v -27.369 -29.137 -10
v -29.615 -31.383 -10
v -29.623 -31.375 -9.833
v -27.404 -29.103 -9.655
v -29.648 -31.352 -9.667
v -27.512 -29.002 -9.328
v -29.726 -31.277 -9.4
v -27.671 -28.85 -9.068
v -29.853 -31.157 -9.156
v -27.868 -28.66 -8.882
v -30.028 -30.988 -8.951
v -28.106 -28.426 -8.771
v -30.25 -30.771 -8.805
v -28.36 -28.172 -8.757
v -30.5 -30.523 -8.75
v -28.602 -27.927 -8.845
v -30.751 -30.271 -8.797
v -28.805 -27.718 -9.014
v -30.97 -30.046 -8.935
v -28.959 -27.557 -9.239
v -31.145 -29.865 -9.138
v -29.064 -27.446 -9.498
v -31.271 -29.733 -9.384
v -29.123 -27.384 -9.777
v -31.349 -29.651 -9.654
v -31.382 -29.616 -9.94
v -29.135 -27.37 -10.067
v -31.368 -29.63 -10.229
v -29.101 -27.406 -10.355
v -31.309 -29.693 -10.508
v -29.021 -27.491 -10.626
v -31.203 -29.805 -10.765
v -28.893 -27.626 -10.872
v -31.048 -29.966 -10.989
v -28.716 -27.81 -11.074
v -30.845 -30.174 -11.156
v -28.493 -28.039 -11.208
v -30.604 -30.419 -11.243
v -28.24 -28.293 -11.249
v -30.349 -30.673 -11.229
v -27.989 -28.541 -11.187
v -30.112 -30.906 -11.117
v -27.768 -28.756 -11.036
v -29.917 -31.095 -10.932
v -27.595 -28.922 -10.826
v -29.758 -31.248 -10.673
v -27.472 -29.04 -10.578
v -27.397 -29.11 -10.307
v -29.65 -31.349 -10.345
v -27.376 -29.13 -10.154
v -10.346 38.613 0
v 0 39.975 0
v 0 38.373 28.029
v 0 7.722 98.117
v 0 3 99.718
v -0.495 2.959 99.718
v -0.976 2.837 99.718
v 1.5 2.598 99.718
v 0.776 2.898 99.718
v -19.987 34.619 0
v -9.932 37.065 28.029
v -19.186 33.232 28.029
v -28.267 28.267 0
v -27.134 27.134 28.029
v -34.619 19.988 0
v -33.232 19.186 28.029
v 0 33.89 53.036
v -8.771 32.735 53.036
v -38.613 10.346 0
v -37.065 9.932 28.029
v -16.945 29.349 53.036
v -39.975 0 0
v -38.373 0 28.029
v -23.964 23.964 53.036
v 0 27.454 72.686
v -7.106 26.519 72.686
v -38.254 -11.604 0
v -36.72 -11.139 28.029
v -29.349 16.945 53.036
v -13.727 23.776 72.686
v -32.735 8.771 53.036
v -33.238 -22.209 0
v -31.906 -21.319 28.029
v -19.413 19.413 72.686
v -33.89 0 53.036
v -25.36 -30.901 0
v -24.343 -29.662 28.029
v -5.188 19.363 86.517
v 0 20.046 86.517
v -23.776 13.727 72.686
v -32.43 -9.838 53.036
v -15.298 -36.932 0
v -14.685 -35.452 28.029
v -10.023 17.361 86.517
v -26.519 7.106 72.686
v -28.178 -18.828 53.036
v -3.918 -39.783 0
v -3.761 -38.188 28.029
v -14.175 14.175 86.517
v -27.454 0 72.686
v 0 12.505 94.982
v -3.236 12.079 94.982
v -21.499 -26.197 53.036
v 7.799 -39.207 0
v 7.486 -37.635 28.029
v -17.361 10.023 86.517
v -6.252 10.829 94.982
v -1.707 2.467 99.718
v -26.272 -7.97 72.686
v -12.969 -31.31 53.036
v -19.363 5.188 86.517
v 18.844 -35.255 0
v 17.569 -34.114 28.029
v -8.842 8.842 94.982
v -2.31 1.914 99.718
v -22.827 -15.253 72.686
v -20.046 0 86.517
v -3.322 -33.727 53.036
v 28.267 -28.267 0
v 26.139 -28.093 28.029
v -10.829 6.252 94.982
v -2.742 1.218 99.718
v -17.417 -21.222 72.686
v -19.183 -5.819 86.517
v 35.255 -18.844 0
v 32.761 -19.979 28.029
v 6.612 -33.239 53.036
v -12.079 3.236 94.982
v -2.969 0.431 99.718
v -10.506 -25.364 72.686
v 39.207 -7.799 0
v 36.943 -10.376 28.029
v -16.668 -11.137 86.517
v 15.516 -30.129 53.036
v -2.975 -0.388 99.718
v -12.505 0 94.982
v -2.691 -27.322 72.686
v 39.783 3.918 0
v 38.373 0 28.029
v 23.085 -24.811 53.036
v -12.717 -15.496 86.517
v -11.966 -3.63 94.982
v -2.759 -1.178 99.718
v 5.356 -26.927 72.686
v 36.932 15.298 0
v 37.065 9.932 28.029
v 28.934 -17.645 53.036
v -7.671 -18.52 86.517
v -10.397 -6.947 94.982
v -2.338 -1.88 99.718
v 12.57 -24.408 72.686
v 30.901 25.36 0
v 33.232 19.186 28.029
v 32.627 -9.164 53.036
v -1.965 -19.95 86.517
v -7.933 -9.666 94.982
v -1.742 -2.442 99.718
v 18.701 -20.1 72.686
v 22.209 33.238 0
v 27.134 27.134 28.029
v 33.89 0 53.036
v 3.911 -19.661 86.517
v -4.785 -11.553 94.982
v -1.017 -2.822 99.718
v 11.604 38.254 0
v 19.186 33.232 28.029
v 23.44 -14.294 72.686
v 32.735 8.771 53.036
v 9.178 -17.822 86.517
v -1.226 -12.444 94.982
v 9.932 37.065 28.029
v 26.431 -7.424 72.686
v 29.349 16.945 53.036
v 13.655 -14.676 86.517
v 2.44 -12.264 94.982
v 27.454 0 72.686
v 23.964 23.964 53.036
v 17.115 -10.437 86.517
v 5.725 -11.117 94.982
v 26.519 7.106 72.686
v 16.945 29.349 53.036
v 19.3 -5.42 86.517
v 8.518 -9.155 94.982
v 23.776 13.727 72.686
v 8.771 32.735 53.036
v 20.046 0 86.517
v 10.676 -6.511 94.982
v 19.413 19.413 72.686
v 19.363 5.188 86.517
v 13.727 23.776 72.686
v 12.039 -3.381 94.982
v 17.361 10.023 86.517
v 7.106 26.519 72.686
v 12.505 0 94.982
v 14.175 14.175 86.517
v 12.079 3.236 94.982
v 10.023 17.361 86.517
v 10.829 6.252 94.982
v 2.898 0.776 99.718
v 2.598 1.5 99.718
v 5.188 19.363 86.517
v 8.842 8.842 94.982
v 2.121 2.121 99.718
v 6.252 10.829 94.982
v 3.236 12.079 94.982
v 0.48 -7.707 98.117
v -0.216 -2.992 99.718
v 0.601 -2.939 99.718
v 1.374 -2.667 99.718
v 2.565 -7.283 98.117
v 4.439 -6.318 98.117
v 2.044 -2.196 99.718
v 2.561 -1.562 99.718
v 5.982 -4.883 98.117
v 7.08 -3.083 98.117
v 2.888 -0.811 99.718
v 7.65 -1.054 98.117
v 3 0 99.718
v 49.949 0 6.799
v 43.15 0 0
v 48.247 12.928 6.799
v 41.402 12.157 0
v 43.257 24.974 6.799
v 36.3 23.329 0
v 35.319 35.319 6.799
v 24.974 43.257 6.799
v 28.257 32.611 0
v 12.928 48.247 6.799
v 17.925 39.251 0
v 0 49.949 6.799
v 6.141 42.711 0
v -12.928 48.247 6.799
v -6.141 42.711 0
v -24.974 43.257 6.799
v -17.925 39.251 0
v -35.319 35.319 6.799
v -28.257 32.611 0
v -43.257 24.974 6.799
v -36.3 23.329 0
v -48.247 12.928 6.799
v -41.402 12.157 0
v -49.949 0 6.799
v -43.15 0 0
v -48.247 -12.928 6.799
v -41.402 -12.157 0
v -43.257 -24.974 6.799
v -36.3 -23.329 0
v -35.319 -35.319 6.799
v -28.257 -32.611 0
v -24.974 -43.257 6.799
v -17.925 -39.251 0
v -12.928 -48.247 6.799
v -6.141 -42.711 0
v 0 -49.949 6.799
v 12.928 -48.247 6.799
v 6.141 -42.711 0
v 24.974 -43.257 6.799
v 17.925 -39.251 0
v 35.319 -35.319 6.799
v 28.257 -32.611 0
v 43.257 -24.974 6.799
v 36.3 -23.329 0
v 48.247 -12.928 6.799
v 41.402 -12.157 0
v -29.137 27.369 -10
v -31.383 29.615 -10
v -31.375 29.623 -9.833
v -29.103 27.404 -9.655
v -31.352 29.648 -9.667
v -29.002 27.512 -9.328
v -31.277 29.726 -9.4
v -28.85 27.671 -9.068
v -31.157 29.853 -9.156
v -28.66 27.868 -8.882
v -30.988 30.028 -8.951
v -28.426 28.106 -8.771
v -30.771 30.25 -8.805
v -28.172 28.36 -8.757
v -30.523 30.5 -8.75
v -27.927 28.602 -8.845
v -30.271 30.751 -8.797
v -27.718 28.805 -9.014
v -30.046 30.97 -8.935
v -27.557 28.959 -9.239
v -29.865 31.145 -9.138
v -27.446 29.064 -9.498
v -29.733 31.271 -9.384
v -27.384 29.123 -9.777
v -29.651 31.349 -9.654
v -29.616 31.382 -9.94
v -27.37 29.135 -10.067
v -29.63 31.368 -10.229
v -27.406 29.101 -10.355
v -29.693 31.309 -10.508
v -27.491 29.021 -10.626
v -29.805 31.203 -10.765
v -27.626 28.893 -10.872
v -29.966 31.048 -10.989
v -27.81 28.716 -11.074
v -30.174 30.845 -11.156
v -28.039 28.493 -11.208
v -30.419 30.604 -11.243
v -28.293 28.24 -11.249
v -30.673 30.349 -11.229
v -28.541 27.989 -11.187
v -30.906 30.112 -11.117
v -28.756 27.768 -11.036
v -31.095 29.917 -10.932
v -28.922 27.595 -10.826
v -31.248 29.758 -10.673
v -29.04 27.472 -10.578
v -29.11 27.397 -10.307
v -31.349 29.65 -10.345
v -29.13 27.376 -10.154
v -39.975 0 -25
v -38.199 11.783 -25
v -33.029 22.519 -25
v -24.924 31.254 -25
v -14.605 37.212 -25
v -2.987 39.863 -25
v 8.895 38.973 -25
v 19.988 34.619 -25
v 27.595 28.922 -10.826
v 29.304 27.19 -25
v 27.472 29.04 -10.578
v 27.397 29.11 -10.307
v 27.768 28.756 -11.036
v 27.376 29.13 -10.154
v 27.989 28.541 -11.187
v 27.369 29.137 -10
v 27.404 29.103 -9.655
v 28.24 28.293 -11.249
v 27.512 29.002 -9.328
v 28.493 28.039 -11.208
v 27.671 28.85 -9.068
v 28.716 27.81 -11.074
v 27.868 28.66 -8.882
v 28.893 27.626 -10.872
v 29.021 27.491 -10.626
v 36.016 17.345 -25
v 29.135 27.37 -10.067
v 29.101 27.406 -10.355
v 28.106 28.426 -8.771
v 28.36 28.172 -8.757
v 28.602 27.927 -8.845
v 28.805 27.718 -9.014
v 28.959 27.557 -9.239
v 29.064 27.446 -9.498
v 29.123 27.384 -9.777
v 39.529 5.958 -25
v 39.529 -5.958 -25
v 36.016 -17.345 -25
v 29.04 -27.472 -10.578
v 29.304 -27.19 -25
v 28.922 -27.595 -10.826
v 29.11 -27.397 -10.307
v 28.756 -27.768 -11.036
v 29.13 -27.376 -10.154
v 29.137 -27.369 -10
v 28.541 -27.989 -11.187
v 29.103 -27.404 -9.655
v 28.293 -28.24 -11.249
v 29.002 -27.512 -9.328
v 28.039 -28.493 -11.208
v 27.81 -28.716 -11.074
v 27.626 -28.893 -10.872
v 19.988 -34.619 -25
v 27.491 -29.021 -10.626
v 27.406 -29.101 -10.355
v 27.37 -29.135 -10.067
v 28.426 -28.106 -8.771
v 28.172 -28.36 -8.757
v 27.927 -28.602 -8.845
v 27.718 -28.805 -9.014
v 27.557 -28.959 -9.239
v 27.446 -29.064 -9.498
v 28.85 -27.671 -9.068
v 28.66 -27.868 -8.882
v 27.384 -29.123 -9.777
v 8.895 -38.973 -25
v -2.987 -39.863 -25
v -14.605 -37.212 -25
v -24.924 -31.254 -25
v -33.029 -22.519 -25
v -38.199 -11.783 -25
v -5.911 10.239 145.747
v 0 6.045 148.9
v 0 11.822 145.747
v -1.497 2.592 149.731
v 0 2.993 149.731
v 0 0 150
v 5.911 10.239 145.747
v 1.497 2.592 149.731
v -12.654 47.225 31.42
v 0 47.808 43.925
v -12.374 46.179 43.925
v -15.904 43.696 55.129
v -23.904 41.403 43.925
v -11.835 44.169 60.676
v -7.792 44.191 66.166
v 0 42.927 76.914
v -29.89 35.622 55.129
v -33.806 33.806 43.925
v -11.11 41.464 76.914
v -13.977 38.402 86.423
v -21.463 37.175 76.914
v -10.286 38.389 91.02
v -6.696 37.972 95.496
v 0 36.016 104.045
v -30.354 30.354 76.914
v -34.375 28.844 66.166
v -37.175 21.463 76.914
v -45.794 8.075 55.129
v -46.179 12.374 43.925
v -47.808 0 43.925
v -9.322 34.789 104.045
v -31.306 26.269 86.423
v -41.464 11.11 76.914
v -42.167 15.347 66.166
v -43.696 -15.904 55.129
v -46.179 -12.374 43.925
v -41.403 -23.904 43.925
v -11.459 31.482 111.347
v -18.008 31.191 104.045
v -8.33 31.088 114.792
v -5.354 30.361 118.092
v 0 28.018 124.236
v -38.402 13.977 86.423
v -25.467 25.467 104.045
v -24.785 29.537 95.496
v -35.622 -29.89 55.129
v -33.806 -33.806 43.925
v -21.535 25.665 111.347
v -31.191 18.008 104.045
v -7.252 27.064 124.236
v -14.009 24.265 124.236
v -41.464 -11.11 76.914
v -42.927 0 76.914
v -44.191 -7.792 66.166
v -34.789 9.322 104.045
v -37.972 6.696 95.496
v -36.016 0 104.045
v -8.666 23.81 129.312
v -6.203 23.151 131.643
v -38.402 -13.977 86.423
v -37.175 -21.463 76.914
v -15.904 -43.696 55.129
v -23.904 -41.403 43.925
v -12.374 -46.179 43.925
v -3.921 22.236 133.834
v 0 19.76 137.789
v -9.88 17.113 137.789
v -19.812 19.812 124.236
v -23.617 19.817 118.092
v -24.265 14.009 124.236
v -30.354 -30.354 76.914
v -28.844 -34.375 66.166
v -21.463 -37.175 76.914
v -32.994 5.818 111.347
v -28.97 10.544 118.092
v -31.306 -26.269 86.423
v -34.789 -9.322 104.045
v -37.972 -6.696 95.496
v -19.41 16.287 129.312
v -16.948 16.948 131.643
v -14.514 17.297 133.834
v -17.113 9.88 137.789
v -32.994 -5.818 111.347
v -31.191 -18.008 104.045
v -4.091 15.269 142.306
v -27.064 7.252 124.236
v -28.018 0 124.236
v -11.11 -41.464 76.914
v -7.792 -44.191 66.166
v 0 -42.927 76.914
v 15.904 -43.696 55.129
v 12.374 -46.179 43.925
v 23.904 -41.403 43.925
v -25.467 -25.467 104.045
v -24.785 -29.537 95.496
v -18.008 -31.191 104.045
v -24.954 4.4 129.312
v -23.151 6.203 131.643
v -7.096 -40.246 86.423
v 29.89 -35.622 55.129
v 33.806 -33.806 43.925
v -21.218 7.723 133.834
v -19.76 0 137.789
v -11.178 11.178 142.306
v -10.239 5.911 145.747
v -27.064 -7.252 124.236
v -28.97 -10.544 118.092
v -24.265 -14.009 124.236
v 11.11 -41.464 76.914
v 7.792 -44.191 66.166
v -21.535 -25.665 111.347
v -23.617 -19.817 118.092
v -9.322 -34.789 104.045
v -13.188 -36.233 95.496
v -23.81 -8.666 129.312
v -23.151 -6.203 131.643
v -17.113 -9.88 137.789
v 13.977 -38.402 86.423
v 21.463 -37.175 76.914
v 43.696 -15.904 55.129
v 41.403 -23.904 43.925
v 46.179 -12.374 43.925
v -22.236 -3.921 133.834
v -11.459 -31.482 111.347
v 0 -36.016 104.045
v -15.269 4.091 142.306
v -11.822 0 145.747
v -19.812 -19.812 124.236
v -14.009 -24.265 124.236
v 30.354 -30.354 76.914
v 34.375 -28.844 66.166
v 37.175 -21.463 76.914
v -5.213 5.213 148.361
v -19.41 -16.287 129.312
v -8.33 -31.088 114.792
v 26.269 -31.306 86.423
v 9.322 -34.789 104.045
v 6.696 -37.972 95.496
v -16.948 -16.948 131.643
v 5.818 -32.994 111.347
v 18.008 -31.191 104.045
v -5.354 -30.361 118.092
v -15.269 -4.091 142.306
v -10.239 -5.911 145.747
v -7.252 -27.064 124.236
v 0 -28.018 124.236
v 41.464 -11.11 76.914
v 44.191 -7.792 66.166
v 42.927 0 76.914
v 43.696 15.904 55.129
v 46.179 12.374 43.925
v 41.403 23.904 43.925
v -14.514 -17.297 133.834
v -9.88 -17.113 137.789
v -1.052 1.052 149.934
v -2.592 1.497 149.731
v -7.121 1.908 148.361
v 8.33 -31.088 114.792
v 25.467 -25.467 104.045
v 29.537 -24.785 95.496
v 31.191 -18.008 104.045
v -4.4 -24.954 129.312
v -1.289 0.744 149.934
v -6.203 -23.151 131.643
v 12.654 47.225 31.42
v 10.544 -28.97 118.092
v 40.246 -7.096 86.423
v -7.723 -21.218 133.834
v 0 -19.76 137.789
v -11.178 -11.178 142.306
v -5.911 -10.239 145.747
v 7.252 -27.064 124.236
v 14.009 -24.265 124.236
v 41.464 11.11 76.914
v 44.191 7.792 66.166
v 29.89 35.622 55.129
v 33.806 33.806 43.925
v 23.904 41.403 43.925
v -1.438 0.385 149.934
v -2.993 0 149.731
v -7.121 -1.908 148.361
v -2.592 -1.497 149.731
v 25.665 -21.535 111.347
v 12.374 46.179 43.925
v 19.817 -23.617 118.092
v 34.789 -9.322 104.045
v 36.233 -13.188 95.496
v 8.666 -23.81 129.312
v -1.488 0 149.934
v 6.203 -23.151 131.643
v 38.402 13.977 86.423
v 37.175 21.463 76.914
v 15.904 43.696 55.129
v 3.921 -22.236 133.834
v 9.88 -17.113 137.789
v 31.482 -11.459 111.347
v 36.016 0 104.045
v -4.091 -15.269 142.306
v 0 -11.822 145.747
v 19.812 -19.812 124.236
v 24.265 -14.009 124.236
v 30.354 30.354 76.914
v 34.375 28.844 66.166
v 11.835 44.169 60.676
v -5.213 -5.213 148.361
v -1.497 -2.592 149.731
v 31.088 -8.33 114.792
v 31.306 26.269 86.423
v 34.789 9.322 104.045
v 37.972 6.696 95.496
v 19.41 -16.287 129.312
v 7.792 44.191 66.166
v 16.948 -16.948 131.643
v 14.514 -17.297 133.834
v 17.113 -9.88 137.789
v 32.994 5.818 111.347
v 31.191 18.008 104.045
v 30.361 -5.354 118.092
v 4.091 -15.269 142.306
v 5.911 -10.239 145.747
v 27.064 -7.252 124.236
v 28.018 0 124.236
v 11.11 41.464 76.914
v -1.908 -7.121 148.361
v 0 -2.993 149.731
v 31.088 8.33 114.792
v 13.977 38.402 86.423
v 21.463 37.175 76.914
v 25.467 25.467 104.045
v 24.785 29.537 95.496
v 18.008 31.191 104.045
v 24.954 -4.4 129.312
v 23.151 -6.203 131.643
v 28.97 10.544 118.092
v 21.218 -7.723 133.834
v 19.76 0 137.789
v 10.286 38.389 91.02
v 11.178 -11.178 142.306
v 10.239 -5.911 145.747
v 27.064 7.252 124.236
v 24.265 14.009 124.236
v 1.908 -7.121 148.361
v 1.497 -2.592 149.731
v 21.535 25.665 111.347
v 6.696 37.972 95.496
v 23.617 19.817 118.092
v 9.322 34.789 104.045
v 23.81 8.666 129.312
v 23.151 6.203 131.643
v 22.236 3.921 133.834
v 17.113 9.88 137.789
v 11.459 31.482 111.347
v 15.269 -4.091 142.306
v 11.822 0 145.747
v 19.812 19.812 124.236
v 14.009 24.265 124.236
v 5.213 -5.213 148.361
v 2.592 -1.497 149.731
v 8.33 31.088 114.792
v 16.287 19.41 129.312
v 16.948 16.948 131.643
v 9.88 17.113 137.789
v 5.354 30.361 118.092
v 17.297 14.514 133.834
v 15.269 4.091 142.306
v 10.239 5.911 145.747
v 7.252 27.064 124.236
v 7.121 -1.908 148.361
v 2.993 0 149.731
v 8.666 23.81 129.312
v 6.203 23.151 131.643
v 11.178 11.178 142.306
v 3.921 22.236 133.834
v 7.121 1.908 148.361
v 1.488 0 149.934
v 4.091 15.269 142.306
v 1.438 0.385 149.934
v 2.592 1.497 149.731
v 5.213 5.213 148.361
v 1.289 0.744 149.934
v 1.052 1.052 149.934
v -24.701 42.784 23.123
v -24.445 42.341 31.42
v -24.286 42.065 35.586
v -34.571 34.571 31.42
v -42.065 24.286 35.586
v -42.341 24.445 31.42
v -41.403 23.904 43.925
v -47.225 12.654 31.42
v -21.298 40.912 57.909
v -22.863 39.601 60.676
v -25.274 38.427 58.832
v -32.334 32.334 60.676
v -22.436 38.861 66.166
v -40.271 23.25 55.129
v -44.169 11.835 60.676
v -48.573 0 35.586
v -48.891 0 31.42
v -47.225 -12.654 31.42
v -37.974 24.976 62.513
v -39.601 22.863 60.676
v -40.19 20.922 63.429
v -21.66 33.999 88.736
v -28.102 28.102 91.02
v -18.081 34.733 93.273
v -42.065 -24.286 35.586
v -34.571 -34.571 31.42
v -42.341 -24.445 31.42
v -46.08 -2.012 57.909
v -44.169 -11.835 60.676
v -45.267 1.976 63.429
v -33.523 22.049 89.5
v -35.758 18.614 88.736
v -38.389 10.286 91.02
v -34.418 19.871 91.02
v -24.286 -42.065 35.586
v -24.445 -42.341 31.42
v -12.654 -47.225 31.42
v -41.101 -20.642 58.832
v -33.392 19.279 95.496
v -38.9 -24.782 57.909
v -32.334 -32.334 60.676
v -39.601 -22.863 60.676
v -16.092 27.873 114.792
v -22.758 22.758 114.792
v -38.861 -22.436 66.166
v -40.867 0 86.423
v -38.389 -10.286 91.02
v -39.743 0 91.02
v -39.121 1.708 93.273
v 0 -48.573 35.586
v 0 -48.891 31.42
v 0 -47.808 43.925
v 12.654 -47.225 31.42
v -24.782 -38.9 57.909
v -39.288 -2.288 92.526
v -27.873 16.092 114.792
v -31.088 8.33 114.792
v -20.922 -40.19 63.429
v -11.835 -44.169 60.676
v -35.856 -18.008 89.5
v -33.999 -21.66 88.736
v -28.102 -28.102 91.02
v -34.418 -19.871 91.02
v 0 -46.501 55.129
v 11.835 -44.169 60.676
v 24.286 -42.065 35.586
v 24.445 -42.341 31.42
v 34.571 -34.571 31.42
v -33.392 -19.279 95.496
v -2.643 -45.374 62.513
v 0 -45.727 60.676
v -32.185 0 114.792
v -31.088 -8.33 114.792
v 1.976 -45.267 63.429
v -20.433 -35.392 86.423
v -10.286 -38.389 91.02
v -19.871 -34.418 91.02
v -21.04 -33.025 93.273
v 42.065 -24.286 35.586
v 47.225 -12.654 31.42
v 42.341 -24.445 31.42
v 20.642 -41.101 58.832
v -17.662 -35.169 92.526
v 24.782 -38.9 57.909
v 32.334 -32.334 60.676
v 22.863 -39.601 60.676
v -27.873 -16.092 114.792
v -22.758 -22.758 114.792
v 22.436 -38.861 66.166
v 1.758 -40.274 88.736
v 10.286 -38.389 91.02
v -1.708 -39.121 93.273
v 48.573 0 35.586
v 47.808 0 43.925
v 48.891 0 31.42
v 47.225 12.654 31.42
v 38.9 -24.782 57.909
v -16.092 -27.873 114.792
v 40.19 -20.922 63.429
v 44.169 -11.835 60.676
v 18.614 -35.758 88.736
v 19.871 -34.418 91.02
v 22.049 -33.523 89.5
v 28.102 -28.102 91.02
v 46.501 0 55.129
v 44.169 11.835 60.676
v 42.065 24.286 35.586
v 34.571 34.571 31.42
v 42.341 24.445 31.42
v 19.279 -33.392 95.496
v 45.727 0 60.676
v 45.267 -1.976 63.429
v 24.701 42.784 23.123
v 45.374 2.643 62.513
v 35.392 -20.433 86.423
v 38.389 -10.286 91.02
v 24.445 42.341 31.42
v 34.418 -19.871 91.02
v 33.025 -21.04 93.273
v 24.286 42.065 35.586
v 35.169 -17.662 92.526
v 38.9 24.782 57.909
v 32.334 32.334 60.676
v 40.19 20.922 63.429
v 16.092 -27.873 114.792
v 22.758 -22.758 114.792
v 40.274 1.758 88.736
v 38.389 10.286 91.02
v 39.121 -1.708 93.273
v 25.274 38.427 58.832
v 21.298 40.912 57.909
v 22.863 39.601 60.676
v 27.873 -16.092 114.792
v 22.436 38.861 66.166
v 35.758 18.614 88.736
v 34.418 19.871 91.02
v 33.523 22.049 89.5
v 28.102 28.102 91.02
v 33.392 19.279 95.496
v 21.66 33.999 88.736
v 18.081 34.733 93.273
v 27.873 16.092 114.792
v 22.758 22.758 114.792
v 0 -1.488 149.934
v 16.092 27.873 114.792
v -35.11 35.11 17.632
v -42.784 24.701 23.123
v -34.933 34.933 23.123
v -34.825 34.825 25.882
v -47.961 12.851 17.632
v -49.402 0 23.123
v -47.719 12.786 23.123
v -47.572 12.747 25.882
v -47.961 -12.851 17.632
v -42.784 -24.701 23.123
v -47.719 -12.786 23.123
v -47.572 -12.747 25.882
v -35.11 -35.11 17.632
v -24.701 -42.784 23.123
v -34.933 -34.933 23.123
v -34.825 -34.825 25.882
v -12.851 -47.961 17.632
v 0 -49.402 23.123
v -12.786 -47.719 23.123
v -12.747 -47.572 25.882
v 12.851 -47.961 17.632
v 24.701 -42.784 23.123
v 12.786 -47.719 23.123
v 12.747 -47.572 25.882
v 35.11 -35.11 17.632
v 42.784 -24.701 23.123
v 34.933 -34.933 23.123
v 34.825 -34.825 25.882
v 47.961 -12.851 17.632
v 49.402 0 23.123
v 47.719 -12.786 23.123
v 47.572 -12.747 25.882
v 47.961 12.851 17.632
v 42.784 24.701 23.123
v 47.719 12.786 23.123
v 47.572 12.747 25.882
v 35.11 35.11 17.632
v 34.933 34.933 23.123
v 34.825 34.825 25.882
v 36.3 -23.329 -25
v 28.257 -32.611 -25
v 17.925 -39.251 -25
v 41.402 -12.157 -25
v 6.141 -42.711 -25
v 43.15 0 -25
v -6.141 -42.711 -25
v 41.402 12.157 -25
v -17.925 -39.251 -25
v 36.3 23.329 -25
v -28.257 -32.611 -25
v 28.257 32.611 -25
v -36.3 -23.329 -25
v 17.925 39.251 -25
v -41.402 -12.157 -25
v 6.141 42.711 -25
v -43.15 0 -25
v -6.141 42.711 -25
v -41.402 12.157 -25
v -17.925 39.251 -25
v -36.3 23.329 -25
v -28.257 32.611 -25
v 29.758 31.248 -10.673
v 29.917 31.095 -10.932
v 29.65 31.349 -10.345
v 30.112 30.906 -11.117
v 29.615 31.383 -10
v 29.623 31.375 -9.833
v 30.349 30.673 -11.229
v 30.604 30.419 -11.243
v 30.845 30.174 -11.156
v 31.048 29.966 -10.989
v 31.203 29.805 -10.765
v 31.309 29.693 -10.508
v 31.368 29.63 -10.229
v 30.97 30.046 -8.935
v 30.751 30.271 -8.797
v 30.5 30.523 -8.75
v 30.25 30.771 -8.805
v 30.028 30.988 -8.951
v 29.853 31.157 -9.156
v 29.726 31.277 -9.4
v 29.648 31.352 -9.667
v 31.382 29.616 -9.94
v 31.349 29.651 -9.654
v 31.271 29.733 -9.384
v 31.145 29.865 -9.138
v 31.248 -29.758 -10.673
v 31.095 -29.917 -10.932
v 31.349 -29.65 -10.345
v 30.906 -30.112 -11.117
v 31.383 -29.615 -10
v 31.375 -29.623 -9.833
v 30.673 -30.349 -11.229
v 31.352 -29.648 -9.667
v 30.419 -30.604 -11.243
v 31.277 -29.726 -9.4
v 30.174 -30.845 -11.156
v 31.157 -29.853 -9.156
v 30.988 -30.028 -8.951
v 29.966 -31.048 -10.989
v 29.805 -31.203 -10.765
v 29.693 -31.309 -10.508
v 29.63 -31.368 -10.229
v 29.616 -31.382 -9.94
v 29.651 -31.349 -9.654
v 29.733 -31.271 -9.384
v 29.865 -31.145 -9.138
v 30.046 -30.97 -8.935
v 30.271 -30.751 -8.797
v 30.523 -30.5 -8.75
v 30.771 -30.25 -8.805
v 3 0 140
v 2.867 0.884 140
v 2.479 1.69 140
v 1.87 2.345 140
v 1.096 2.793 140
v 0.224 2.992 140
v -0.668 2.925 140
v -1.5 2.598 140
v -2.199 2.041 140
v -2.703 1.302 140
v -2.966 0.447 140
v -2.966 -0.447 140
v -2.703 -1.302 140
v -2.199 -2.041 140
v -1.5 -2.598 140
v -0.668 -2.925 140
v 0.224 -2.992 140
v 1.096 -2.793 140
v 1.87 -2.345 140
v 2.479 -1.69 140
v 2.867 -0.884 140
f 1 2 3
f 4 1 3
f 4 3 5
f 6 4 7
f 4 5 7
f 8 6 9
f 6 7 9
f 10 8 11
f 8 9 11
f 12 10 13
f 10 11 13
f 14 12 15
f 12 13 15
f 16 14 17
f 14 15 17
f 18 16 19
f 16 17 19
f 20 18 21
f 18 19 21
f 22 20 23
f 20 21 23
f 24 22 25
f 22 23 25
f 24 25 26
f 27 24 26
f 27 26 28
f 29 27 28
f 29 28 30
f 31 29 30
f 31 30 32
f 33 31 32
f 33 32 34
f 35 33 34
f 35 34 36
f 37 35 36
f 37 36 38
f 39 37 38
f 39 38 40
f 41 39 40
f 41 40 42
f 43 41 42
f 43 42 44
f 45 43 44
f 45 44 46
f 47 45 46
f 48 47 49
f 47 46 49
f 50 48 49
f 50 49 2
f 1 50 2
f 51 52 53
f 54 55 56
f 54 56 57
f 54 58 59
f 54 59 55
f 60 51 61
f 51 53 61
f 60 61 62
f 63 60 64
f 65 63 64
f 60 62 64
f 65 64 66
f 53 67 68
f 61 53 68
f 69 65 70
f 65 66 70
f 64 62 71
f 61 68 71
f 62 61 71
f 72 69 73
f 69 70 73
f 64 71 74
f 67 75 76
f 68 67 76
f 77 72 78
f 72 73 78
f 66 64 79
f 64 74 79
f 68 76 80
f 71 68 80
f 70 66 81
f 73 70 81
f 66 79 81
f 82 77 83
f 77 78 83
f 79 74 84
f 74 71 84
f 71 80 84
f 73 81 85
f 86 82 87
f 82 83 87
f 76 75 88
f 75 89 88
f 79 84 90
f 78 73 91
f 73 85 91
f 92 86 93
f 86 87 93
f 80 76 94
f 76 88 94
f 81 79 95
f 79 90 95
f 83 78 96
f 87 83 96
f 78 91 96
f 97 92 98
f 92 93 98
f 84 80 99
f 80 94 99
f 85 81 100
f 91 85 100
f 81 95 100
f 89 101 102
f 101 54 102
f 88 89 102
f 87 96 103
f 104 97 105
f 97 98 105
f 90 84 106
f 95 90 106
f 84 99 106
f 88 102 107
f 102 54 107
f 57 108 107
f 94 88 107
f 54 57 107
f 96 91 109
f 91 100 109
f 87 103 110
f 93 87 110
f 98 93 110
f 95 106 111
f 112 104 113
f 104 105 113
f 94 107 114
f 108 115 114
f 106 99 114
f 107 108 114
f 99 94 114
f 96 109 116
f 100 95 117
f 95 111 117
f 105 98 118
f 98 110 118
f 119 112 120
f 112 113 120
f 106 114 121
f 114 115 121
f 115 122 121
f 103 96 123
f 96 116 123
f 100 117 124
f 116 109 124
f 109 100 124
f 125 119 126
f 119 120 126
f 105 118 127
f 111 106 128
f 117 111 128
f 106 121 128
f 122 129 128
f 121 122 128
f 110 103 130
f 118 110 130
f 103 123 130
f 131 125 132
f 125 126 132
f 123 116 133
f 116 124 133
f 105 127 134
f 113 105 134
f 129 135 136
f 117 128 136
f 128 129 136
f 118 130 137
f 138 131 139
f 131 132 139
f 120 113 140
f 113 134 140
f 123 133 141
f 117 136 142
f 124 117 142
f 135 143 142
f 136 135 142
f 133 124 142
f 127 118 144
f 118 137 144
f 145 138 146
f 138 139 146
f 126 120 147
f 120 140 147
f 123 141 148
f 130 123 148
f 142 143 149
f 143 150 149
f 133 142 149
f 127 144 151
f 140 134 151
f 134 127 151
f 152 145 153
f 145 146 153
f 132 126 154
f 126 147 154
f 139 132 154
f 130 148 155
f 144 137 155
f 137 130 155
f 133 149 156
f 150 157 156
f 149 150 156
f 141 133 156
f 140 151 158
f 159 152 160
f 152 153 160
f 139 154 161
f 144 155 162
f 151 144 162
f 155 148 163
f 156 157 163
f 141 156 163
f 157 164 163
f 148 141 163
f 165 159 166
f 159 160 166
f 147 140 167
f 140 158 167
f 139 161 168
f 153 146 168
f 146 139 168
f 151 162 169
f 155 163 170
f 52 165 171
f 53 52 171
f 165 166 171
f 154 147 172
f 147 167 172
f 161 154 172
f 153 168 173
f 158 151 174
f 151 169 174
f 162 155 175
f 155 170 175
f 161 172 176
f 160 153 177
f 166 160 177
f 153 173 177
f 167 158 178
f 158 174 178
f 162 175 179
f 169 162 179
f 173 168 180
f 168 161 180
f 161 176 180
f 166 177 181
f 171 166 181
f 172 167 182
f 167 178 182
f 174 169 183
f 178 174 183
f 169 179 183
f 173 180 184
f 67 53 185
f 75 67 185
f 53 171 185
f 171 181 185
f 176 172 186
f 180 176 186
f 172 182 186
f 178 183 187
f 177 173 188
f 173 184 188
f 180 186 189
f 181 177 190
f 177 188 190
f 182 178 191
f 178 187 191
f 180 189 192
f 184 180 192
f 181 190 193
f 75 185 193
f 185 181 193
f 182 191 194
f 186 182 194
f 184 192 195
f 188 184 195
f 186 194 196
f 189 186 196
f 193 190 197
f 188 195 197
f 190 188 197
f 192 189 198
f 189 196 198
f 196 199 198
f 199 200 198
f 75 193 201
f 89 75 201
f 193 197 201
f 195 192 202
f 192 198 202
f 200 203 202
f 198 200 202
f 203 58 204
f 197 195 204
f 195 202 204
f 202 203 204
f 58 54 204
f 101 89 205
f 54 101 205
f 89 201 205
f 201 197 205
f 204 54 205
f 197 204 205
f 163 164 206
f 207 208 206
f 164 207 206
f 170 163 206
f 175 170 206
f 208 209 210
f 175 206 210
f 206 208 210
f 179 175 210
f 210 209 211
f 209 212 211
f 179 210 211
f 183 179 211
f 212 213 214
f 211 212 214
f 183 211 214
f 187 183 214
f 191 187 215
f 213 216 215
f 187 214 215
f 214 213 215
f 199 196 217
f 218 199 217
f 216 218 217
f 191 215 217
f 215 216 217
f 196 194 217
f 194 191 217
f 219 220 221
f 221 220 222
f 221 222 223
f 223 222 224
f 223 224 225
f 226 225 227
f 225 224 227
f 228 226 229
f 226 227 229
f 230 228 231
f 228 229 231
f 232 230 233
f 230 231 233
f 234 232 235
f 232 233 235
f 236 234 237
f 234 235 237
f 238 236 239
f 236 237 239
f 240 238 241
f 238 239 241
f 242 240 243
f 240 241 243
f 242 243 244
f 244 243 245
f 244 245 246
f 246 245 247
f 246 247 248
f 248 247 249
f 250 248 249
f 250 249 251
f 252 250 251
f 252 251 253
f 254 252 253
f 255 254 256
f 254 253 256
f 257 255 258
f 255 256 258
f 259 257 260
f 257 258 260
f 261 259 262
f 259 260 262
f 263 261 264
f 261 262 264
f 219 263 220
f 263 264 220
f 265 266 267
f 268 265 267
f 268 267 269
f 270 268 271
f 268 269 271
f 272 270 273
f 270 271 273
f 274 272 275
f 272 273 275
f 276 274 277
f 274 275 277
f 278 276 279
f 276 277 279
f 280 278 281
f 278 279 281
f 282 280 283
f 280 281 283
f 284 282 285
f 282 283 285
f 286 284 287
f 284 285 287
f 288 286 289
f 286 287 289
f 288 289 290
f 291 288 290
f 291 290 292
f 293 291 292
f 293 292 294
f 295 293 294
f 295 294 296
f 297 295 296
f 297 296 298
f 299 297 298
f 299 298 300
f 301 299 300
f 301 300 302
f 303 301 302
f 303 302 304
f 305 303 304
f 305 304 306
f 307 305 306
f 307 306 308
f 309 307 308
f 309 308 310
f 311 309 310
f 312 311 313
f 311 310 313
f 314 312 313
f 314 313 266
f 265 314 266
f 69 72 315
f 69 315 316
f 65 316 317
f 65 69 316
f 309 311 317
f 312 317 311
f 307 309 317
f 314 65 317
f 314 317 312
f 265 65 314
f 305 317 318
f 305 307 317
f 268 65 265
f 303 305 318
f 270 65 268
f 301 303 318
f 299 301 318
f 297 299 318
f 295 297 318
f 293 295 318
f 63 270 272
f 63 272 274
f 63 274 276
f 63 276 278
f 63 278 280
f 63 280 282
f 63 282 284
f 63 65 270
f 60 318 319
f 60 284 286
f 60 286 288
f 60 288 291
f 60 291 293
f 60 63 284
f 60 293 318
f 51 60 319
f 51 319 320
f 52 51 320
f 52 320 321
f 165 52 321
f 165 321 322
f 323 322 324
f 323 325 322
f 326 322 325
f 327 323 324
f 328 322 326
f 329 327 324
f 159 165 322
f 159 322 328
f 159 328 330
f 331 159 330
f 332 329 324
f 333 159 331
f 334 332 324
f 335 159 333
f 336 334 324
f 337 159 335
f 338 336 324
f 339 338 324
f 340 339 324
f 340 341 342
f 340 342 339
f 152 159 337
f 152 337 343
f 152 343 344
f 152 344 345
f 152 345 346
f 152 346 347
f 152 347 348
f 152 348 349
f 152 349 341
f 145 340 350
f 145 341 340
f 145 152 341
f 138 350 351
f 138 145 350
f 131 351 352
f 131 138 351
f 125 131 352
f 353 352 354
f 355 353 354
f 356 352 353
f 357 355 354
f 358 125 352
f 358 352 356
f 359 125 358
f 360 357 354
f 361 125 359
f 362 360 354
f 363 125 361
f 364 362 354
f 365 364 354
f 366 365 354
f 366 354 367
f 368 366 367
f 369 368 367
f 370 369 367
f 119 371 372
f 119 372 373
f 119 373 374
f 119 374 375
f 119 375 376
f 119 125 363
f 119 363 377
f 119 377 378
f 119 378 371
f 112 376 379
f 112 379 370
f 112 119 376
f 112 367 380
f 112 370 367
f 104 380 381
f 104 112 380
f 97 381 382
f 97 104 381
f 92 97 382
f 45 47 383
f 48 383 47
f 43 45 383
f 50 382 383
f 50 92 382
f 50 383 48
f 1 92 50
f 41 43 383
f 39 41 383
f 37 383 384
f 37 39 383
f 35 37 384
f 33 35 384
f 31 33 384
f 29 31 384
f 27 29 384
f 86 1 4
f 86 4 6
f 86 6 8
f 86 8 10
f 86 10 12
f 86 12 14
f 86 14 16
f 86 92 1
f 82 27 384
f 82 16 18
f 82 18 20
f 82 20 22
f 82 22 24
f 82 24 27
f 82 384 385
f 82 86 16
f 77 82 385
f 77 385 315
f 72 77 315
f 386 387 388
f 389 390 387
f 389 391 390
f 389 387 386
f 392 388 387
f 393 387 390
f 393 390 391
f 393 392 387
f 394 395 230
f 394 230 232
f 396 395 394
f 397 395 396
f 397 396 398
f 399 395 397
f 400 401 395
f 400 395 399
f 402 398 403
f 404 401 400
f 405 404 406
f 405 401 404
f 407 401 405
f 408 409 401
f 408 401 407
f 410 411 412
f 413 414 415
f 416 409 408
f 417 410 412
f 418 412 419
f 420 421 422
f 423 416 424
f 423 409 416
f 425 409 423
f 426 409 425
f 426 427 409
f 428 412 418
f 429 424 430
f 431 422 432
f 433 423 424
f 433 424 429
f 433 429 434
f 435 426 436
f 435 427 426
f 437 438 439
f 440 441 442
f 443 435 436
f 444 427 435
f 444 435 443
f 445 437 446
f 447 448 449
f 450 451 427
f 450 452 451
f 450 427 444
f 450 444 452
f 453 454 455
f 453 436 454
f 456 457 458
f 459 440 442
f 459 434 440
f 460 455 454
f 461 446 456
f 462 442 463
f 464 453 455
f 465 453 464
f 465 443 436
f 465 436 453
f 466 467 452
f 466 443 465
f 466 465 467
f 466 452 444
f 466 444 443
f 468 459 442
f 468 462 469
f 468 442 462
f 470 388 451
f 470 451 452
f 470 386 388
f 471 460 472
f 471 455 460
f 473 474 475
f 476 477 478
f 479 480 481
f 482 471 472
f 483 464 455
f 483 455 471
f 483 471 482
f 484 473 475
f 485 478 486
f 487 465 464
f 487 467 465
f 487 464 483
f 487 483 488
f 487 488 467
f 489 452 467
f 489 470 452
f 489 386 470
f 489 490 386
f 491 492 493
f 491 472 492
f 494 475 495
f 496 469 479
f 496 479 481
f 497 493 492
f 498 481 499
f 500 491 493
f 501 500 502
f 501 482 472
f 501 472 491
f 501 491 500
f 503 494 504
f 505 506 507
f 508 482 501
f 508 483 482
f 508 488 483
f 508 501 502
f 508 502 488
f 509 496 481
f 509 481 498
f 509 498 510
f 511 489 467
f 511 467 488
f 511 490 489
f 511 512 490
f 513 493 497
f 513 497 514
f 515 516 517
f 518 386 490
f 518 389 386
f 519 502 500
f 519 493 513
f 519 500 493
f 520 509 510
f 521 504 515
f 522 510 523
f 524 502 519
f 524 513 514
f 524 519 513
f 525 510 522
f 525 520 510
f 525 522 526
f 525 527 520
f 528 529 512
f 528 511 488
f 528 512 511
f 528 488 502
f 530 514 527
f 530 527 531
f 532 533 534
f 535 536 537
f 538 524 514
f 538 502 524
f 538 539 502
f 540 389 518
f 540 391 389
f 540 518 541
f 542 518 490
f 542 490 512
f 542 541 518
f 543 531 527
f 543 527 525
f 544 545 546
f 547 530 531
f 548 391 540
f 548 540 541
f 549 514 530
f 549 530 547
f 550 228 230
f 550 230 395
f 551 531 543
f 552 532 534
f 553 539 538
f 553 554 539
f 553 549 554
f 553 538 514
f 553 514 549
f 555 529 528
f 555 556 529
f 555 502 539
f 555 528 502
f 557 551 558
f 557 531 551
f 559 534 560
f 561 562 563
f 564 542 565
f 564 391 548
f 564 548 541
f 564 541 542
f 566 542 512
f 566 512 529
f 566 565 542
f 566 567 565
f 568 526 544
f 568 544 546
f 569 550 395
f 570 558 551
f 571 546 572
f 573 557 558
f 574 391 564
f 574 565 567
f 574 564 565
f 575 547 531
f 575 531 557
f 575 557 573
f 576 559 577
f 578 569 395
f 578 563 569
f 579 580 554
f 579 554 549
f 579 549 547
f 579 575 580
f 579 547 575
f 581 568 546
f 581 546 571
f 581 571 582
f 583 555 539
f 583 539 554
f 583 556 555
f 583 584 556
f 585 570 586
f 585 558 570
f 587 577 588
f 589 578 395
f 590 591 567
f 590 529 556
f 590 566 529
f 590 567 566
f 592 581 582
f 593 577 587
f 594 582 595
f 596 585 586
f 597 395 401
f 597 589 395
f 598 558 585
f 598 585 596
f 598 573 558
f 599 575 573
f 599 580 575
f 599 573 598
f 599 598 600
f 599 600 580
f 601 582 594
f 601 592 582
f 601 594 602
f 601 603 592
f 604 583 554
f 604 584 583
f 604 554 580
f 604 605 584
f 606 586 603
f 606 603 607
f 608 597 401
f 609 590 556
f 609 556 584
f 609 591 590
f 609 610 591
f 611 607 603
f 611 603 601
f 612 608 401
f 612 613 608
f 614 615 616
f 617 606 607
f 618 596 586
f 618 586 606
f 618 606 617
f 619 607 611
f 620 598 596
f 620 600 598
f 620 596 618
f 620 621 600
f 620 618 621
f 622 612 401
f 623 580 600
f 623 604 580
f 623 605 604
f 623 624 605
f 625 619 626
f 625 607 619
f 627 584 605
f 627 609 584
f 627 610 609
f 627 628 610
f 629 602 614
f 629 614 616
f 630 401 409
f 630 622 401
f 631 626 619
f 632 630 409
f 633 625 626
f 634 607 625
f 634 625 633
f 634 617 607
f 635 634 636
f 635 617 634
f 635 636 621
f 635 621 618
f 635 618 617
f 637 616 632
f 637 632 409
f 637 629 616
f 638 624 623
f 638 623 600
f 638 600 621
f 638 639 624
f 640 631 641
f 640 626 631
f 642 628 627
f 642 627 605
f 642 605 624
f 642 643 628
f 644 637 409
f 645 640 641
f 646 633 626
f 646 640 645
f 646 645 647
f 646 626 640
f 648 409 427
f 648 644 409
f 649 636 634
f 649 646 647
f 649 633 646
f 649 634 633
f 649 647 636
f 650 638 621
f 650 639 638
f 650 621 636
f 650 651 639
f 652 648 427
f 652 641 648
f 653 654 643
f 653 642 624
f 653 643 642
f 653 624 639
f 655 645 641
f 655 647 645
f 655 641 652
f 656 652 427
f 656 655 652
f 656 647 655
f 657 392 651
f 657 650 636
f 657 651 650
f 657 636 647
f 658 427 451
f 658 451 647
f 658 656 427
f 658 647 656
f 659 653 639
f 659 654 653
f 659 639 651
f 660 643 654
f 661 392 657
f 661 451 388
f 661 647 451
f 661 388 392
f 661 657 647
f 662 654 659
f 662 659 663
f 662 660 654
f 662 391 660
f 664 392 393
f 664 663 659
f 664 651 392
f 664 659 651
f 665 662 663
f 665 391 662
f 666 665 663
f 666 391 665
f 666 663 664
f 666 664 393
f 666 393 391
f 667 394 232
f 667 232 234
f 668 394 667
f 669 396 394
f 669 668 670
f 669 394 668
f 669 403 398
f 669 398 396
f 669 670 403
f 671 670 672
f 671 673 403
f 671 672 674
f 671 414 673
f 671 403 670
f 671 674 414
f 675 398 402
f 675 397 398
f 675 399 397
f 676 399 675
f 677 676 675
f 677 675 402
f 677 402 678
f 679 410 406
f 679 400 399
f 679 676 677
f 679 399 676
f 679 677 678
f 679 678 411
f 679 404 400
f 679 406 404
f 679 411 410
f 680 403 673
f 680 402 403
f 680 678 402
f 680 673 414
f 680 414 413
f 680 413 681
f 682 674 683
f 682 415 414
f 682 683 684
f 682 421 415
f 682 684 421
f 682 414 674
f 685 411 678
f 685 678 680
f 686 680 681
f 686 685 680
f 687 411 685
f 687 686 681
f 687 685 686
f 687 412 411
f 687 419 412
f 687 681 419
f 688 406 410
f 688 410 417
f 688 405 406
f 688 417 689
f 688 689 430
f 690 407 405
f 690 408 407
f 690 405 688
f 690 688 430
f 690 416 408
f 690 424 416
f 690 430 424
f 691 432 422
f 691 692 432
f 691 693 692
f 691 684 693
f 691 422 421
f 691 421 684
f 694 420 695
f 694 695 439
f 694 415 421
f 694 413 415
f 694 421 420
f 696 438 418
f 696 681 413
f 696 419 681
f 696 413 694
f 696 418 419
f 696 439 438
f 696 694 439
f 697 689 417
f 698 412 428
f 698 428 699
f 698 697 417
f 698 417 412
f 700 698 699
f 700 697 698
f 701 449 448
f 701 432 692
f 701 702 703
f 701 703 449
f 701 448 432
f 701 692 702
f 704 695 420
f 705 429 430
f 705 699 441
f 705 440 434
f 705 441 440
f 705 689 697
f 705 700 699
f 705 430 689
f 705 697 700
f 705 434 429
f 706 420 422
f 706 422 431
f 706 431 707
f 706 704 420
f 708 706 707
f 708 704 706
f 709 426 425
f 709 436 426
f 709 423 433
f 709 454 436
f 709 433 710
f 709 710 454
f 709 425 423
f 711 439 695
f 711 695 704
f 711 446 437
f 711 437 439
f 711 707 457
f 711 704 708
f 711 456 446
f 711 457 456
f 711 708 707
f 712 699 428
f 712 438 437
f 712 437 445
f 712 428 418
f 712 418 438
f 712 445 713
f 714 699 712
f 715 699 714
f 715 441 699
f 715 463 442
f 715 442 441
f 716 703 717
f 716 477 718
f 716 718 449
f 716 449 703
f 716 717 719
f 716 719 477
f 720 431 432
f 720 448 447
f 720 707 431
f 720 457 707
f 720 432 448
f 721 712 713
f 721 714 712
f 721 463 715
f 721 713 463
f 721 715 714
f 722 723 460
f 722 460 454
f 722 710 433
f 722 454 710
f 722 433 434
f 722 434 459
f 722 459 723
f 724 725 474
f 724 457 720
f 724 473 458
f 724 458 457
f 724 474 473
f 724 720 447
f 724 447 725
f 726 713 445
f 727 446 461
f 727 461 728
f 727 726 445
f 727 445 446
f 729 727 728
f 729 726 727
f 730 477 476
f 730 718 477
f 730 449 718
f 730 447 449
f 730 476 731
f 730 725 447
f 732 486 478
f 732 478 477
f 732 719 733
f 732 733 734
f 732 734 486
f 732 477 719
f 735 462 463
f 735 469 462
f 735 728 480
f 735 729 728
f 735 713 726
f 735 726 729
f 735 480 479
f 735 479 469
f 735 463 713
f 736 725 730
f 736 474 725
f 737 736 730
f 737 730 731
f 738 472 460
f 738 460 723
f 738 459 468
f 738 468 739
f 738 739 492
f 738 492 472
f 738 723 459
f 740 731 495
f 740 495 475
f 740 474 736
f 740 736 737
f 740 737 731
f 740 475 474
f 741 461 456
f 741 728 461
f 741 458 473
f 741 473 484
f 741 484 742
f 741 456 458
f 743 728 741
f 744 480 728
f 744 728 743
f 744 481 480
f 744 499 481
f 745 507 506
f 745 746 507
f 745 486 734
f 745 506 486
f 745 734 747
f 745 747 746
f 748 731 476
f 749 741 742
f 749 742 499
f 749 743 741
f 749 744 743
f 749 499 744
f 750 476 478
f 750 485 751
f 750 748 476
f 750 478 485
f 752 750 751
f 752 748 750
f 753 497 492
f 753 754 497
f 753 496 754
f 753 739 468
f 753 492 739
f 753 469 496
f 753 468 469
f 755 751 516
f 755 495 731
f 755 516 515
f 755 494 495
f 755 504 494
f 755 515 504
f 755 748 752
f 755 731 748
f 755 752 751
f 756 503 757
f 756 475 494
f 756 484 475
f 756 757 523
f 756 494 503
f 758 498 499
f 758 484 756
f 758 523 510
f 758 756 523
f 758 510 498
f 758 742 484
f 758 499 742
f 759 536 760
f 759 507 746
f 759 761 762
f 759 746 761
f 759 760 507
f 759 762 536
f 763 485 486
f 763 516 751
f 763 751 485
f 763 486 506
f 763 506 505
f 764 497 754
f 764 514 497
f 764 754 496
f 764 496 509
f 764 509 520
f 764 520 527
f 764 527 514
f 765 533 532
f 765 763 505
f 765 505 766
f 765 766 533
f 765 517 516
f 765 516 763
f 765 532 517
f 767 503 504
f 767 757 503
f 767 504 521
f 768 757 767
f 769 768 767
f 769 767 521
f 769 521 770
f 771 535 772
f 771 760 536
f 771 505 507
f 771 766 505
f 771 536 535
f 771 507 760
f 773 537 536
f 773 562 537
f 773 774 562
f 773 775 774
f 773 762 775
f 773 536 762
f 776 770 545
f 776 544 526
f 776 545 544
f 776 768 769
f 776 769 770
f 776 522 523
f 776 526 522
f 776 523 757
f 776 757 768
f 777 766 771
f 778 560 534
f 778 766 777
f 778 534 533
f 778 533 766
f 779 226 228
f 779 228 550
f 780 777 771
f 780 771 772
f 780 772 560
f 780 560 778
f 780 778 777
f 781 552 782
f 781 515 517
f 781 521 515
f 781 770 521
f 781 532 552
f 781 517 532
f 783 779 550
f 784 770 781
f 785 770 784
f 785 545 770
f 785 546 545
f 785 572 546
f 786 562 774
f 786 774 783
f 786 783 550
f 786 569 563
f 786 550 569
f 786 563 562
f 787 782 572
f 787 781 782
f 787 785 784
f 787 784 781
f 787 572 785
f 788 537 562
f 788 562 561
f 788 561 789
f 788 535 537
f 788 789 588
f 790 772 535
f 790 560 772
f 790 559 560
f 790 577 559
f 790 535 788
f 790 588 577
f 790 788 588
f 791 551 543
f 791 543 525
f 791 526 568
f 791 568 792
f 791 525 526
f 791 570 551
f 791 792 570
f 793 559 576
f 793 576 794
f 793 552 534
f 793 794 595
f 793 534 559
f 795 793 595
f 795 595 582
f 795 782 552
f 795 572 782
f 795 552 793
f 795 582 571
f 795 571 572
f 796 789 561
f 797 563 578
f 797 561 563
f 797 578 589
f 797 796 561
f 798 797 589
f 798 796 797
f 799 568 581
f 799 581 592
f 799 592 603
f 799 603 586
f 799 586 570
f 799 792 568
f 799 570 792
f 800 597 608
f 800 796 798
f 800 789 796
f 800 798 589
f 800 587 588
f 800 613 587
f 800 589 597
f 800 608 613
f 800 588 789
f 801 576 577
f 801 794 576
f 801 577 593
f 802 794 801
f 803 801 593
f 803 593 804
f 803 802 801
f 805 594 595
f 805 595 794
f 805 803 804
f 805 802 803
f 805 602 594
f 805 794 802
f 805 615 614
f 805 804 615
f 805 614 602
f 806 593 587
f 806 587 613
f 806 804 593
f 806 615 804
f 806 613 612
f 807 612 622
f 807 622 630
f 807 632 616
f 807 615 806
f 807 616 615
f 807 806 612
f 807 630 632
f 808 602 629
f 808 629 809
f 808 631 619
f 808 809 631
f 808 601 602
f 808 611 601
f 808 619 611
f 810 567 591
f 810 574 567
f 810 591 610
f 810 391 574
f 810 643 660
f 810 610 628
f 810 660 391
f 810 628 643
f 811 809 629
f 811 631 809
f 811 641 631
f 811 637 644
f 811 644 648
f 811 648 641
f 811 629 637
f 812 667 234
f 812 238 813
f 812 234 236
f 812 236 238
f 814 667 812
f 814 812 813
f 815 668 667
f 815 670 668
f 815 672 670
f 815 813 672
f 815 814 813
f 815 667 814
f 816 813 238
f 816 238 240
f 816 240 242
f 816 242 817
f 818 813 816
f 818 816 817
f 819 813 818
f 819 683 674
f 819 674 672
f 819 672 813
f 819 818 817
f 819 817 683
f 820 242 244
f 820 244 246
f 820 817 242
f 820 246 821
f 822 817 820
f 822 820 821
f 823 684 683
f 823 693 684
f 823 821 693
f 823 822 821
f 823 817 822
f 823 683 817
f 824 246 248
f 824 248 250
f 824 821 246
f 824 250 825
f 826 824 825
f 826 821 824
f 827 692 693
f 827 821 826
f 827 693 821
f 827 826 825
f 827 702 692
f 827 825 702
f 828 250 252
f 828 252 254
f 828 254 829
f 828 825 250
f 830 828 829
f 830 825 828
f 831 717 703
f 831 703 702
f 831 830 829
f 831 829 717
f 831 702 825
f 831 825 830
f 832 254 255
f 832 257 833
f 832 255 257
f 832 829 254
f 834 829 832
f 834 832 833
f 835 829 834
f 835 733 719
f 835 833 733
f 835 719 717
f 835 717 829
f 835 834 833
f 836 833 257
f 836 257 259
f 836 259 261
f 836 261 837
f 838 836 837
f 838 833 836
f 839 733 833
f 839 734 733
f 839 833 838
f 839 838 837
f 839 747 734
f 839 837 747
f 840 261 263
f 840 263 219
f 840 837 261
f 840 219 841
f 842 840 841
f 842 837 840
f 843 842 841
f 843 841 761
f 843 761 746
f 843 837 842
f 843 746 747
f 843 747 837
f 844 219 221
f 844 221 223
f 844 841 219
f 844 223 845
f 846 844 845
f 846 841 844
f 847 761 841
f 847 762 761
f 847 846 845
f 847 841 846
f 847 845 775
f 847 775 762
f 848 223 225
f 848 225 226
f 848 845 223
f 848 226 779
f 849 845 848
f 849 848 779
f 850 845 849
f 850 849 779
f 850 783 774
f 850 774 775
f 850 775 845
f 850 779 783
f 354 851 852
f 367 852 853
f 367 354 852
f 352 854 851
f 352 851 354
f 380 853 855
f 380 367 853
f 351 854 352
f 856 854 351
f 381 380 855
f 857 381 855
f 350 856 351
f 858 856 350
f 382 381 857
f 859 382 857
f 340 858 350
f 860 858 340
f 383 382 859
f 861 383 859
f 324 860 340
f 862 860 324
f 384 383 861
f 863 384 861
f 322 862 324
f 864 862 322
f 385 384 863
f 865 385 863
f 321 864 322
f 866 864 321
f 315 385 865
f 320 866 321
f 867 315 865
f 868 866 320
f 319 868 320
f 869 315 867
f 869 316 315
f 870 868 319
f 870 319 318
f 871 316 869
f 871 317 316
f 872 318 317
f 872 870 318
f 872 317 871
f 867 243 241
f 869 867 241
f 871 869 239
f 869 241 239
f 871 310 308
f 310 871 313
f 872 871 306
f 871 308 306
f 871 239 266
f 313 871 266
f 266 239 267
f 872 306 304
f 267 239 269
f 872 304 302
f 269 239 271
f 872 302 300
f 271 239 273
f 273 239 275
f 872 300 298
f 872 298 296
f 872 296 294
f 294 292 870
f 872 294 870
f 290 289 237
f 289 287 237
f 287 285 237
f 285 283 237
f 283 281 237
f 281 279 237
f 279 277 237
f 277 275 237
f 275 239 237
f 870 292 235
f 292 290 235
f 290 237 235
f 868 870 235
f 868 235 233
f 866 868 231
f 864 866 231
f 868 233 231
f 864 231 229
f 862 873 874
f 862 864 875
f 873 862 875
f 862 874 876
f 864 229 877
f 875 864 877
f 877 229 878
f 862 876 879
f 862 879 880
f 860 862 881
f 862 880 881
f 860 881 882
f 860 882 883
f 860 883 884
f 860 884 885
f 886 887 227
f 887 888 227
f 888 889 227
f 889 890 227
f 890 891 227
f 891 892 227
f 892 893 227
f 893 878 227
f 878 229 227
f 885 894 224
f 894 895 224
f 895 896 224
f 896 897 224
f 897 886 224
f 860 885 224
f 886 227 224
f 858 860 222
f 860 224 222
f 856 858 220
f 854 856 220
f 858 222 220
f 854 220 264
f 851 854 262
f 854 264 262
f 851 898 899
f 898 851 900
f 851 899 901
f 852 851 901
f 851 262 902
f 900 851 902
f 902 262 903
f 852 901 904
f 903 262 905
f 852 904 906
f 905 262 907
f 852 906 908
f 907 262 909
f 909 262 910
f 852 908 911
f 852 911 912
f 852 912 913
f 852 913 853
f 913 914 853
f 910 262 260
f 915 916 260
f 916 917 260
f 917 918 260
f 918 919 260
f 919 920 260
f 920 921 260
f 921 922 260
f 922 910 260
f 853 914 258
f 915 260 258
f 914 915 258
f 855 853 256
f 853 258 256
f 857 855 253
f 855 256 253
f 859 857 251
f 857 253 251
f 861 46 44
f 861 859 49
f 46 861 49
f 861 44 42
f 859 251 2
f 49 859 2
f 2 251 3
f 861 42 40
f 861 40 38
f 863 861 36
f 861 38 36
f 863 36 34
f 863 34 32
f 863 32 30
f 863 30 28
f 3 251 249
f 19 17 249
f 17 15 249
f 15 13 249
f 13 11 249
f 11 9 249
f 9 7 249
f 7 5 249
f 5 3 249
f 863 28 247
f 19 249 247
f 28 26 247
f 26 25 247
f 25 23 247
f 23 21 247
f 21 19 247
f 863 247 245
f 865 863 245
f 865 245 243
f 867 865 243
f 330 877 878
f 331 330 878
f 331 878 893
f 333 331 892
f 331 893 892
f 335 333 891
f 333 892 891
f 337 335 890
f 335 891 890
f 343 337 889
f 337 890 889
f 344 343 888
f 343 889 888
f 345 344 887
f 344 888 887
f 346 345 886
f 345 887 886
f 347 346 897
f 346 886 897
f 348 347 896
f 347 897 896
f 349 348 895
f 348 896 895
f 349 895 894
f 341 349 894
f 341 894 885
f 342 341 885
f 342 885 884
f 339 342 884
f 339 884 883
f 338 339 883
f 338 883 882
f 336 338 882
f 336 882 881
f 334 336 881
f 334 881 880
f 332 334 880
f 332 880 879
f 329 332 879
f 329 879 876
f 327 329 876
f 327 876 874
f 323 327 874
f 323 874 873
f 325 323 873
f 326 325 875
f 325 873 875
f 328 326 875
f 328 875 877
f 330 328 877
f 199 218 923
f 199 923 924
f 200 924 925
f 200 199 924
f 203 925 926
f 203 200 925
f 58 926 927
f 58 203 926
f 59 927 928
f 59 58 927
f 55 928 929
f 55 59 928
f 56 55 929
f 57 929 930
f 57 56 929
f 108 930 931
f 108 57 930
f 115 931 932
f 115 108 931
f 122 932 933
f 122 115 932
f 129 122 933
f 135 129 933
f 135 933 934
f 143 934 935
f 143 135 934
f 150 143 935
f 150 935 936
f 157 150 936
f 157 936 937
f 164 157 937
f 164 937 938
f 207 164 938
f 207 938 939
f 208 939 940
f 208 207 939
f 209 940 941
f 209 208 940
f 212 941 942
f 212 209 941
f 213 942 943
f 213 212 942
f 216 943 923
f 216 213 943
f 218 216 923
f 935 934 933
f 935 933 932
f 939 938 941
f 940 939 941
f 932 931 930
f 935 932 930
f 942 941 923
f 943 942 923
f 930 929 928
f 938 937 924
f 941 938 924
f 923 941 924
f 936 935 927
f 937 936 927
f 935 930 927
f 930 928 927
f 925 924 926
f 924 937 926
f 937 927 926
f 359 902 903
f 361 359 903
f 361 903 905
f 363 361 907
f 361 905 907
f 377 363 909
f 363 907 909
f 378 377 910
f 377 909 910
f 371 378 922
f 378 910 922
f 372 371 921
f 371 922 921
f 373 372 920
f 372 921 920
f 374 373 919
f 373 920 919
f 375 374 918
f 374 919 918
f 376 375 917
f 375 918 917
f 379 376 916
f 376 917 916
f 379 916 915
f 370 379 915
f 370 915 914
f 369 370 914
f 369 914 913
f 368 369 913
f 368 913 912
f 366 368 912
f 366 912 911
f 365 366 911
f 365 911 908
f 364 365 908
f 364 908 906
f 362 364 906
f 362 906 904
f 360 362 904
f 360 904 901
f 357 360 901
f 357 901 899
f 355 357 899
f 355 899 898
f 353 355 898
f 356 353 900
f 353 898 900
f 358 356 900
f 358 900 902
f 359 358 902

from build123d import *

# Parameters (mm, degrees)
UPPER_AIRFRAME_COUPLER_SKETCH_R      = 43.15
UPPER_AIRFRAME_COUPLER_SKETCH_R_2    = 39.975
UPPER_AIRFRAME_COUPLER_EXTRUDE_DEPTH = 25
SHEAR_PIN_BORE_CUT_REACH             = 190.276
SHEAR_PIN_BORE_CUT_END_RADIUS        = 39.975
SHEAR_PIN_BORE_SKETCH_R              = 1.25
SHEAR_PIN_PATTERN_COUNT              = 4
CUT_EXTRUDE2_DEPTH                   = 40
CUT_EXTRUDE2_DEPTH_BACK              = 144.578301529
SKETCH1_R                            = 3


with BuildPart() as part:
    # Ellipsoid Sketch → Ellipsoid Revolve (revolve)
    with BuildSketch(Plane(origin=(0, 0, 0), x_dir=(0, 0, -1), z_dir=(1, 0, 0))):
        with BuildLine():
            Line((-150, 0), (-100, 0))
            add(Edge.make_bspline(
                [(0, 39.975), (-100, 39.975), (-100, 0)],
                knots=[4.71238898, 4.71238898, 4.71238898, 6.283185307, 6.283185307, 6.283185307], degree=2, weights=[1, 0.707106781, 1]))
            Line((0, 39.975), (0, 50))
            add(Edge.make_bspline(
                [(0, 50), (-150, 50), (-150, 0)],
                knots=[4.71238898, 4.71238898, 4.71238898, 6.283185307, 6.283185307, 6.283185307], degree=2, weights=[1, 0.707106781, 1]))
        make_face()
    revolve(axis=Axis((0, 0, -7.5), (0, 0, 1)))

    # Upper Airframe Coupler Sketch → Upper Airframe Coupler Extrude (add)
    with BuildSketch(Plane(origin=(0, 0, 0), x_dir=(-1, 0, 0), z_dir=(0, 0, -1))):
        Circle(UPPER_AIRFRAME_COUPLER_SKETCH_R)
        Circle(UPPER_AIRFRAME_COUPLER_SKETCH_R_2, mode=Mode.SUBTRACT)
    extrude(amount=UPPER_AIRFRAME_COUPLER_EXTRUDE_DEPTH)

    # Upper Airframe Mate Chamfer: read off the stored shape, not the designer's step
    # Upper Airframe Mate Chamfer outline → Upper Airframe Mate Chamfer (revolve, cut)
    with BuildSketch(Plane.XZ):
        Polygon((49.948616721, 6.798616721), (43.15, 0), (50, 0), (50, 6.798616721), align=None)
    revolve(axis=Axis((0, 0, 0), (0, 0, 1)), mode=Mode.SUBTRACT)

    # Shear Pin Bore Cut: up to this cylinder (the profile starts outside it)
    shear_pin_bore_cut_end = Plane(origin=(0, 0, -10), z_dir=(0, 0, -1)) * Cylinder(SHEAR_PIN_BORE_CUT_END_RADIUS, 461.502, mode=Mode.PRIVATE)
    # Shear Pin Bore Sketch → Shear Pin Bore Cut (cut, up to the surface)
    with BuildSketch(Plane(origin=(30.511657608, -30.511657608, 0), x_dir=(-0.7071067811865475, -0.7071067811865477, 0), z_dir=(0.7071067811865477, -0.7071067811865475, 0)), mode=Mode.PRIVATE) as shear_pin_bore_cut_sk1:
        with Locations(Location((0, 10, 0), (0, 0, 180))):
            Circle(SHEAR_PIN_BORE_SKETCH_R)
    shear_pin_bore_cut_tool1 = extrude(shear_pin_bore_cut_sk1.sketch, amount=-SHEAR_PIN_BORE_CUT_REACH, mode=Mode.PRIVATE) - shear_pin_bore_cut_end
    shear_pin_bore_cut = shear_pin_bore_cut_tool1.solids().sort_by_distance((30.511658, -30.511658, -10))[0]
    add(shear_pin_bore_cut, mode=Mode.SUBTRACT)

    # Shear Pin Pattern: Shear Pin Bore Cut ×4 about axis
    shear_pin_pattern_axis = Axis((0, 0, 0), (0, 0, 1))
    for i in range(1, SHEAR_PIN_PATTERN_COUNT):
        add(shear_pin_bore_cut.rotate(shear_pin_pattern_axis, i * 360 / SHEAR_PIN_PATTERN_COUNT), mode=Mode.SUBTRACT)

    # Sketch1 → Cut-Extrude2 (cut, two sides: drawn at the far end of the back side and taken through both)
    with BuildSketch(Plane.XY.offset(100).offset(-CUT_EXTRUDE2_DEPTH_BACK)):
        Circle(SKETCH1_R)
    extrude(amount=CUT_EXTRUDE2_DEPTH + CUT_EXTRUDE2_DEPTH_BACK, mode=Mode.SUBTRACT)


solid = part.part
